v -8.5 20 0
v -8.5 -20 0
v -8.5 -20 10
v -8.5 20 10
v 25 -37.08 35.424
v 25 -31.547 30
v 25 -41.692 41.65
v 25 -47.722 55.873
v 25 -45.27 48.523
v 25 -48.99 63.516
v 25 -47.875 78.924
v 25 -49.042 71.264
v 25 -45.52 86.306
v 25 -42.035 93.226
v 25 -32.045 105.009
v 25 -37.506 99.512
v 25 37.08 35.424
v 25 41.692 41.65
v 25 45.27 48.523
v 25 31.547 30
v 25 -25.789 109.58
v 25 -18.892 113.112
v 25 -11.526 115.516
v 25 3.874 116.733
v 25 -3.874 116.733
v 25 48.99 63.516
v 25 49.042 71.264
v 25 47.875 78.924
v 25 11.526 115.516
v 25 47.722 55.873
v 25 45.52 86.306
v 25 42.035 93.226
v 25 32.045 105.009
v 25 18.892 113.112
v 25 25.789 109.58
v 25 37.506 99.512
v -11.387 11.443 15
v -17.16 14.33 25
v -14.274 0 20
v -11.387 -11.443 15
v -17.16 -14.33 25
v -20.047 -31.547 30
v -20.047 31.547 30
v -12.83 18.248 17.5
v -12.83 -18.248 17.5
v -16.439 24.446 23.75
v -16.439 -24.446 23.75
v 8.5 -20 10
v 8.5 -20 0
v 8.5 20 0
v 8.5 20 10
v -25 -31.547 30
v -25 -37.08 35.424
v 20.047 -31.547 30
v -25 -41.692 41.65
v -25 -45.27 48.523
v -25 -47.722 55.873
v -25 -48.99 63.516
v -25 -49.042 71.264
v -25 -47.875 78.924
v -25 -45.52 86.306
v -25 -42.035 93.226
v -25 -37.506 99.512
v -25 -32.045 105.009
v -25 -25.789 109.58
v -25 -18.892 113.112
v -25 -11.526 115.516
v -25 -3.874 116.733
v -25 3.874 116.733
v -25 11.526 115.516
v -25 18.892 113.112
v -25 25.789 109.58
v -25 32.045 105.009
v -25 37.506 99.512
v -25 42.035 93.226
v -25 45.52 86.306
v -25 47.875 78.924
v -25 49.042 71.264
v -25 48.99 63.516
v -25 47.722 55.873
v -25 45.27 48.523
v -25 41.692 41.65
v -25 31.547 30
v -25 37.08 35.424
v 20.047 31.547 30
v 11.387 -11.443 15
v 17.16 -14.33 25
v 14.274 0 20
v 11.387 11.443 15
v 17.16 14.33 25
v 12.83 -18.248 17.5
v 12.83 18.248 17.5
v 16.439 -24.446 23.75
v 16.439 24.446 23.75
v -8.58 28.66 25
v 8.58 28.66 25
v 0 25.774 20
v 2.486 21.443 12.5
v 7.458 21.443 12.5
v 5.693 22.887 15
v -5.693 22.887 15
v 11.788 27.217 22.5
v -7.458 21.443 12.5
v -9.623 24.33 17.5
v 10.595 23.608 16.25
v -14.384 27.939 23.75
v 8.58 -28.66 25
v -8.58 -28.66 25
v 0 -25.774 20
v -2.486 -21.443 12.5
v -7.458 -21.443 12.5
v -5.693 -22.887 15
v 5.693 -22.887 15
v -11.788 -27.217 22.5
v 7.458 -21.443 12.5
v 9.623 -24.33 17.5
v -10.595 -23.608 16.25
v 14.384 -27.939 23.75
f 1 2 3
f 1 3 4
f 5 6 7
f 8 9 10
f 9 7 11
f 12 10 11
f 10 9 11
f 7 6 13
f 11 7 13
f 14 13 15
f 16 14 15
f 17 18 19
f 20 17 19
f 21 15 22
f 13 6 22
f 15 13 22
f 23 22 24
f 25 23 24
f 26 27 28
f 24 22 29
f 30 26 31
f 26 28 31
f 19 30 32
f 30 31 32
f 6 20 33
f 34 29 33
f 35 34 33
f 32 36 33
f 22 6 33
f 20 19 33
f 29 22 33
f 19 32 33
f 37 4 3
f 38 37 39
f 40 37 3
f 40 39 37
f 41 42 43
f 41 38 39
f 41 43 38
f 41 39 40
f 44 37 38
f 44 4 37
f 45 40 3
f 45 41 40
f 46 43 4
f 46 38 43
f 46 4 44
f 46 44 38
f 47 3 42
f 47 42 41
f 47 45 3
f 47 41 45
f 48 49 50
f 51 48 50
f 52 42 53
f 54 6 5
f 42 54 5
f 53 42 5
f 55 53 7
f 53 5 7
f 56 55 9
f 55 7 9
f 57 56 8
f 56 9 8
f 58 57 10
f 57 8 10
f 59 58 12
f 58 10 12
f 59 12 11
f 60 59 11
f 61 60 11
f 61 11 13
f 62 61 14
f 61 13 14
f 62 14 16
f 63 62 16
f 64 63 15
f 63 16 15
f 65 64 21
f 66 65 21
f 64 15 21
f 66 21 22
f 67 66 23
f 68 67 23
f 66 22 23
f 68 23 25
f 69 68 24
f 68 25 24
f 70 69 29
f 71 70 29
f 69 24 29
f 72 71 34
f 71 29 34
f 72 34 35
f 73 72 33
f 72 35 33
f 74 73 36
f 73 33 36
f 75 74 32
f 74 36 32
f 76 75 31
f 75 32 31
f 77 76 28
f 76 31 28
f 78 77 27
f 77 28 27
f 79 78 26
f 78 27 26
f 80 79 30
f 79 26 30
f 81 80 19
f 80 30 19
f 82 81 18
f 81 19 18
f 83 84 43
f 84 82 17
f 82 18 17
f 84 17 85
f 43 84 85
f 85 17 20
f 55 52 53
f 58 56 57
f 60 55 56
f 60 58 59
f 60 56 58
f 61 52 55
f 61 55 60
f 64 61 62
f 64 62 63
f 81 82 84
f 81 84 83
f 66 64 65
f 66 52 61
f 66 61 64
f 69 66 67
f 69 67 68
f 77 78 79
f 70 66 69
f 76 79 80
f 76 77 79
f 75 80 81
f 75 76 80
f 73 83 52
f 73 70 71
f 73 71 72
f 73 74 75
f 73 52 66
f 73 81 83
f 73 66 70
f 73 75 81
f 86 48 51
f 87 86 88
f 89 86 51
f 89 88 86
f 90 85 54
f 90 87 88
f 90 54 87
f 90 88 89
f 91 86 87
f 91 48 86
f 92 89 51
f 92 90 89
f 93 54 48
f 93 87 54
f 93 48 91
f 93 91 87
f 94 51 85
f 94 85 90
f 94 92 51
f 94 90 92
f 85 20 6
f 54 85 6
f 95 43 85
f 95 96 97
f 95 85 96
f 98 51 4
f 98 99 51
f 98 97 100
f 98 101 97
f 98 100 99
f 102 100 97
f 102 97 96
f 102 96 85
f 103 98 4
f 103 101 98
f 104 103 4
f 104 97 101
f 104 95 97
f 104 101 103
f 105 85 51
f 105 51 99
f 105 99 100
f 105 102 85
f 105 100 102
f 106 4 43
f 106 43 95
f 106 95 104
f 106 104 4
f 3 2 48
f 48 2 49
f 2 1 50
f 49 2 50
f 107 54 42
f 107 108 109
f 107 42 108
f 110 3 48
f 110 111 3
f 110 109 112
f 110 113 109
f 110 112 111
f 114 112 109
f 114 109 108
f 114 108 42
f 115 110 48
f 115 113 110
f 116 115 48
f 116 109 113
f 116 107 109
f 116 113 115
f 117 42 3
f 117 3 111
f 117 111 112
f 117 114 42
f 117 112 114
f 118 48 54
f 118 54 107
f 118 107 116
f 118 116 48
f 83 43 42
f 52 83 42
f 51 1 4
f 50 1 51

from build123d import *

# Parameters (mm, degrees)
SKETCH_1_W      = 17
SKETCH_1_H      = 40
EXTRUDE_1_DEPTH = 10
SKETCH_2_W      = 17
SKETCH_2_H      = 40
EXTRUDE_2_DEPTH = 20
EXTRUDE_2_TAPER = -30
EXTRUDE_3_DEPTH = 25


with BuildPart() as part:
    # 草图1 → 凸台-拉伸1 (new body)
    with BuildSketch(Plane.XY):
        Rectangle(SKETCH_1_W, SKETCH_1_H)
    extrude(amount=EXTRUDE_1_DEPTH)

    # 草图2 → 凸台-拉伸2 (add)
    with BuildSketch(Plane.XY.offset(10)):
        Rectangle(SKETCH_2_W, SKETCH_2_H)
    extrude(amount=EXTRUDE_2_DEPTH, taper=EXTRUDE_2_TAPER)

    # 草图3 → 凸台-拉伸3 (add, symmetric)
    with BuildSketch(Plane(origin=(0, 0, 0), x_dir=(0, 0, -1), z_dir=(1, 0, 0))):
        with BuildLine():
            Line((-30, 31.547005384), (-30, -31.547005384))
            ThreePointArc((-30, -31.547005384), (-116.885818272, 0), (-30, 31.547005384))
        make_face()
    extrude(amount=EXTRUDE_3_DEPTH, both=True)


solid = part.part
